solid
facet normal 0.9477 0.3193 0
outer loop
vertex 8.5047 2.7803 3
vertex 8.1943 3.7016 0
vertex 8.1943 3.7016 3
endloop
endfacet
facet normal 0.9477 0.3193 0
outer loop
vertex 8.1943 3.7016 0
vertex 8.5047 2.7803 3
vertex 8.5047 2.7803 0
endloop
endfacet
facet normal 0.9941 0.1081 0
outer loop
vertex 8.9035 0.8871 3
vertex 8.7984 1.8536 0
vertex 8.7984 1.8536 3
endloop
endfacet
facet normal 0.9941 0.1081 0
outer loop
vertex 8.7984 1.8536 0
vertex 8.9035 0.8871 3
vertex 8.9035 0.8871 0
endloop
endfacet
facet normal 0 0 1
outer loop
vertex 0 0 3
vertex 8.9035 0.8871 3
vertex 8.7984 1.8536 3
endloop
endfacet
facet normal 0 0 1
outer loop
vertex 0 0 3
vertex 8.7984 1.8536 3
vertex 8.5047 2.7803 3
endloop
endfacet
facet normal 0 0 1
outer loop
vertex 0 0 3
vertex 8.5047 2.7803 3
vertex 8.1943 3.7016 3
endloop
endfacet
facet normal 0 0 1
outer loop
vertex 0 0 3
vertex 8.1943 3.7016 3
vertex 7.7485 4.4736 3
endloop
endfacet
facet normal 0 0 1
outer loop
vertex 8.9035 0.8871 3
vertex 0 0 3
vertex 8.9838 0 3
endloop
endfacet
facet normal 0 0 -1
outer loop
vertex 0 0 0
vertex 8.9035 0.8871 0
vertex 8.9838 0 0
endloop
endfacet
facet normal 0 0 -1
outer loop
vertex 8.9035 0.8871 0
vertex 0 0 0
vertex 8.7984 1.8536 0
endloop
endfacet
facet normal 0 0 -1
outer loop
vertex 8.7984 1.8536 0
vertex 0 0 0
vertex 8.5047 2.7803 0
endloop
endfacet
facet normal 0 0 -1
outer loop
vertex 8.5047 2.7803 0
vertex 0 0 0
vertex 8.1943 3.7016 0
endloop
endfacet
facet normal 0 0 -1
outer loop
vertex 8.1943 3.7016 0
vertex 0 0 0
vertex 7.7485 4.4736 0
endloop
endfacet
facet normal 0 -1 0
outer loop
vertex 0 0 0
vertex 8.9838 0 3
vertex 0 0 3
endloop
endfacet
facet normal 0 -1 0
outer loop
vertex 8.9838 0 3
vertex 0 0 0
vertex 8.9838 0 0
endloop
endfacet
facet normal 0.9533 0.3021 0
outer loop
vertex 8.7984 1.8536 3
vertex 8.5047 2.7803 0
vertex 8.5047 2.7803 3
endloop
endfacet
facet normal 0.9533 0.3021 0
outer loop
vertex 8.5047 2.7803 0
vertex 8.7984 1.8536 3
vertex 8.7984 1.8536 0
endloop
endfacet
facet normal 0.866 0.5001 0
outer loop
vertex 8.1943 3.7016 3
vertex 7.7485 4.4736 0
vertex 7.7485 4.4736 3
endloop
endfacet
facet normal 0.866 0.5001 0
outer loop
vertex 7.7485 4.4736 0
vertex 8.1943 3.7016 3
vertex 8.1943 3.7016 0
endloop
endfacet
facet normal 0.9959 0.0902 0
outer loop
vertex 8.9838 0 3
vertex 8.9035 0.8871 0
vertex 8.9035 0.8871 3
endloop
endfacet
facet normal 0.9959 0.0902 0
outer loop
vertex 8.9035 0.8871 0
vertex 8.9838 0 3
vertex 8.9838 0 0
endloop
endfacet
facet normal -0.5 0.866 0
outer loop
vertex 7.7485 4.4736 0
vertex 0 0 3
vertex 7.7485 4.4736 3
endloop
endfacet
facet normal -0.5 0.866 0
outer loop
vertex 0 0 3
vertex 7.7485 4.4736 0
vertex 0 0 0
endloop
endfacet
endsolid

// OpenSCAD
toleranta=1;//toleranta la desenare

//______________cu diferenta
module felie_pizza_diference(diametru,grosime,unghi_felie)
{
    
    difference(){
        cylinder(h=grosime,r=diametru/2);
        translate([-diametru/2-toleranta,-diametru/2-toleranta,-toleranta])     cube([diametru+2*toleranta, diametru/2+toleranta,grosime+2*toleranta        ]);       
        rotate([0,0,30]) translate([-diametru/2-toleranta,0,-toleranta]) cube([     diametru+2*toleranta, diametru/2+toleranta,grosime+2*toleranta]);   
    }
}    
//enn______________cu diferenta   
module felie_pizza_intersection(diametru,grosime,unghi_felie)
{
    
    intersection(){
        cylinder(h=grosime,r=diametru/2);
        translate([-diametru/2-toleranta,0,-toleranta]) cube([diametru+2*toleranta, diametru/2+toleranta,grosime+2*toleranta]);  
        rotate([0,0,-(90-unghi_felie)]) cube([diametru/2+toleranta, diametru/2+toleranta,grosime+2*toleranta]);      
        
        }
    }
        
 module felie_pizza_intersection_1(diametru,grosime,unghi_felie)
{
    intersection()//intersectie de 2 intersectii
    {
            intersection()//intersectie 1
        {
            cylinder(h=grosime,r=diametru/2);
            translate([-diametru/2-toleranta,0,-toleranta]) cube([diametru+2*           toleranta, diametru/2+toleranta,grosime+2*toleranta]);  
        }
        
    rotate([0,0,-(180-unghi_felie)])  intersection()//intersectie2 rotita 150
        { 
            cylinder(h=grosime,r=diametru/2);
            translate([-diametru/2-toleranta,0,-toleranta]) cube([diametru+2*       toleranta, diametru/2+toleranta,grosime+2*toleranta]);  
        }
       
    }      
}  
//felie_pizza_diference(diametru=30,grosime=3,unghi_felie=30);
//felie_pizza_intersection(diametru=18,grosime=3,unghi_felie=30);  
felie_pizza_intersection_1(diametru=18,grosime=3,unghi_felie=30); 
    
